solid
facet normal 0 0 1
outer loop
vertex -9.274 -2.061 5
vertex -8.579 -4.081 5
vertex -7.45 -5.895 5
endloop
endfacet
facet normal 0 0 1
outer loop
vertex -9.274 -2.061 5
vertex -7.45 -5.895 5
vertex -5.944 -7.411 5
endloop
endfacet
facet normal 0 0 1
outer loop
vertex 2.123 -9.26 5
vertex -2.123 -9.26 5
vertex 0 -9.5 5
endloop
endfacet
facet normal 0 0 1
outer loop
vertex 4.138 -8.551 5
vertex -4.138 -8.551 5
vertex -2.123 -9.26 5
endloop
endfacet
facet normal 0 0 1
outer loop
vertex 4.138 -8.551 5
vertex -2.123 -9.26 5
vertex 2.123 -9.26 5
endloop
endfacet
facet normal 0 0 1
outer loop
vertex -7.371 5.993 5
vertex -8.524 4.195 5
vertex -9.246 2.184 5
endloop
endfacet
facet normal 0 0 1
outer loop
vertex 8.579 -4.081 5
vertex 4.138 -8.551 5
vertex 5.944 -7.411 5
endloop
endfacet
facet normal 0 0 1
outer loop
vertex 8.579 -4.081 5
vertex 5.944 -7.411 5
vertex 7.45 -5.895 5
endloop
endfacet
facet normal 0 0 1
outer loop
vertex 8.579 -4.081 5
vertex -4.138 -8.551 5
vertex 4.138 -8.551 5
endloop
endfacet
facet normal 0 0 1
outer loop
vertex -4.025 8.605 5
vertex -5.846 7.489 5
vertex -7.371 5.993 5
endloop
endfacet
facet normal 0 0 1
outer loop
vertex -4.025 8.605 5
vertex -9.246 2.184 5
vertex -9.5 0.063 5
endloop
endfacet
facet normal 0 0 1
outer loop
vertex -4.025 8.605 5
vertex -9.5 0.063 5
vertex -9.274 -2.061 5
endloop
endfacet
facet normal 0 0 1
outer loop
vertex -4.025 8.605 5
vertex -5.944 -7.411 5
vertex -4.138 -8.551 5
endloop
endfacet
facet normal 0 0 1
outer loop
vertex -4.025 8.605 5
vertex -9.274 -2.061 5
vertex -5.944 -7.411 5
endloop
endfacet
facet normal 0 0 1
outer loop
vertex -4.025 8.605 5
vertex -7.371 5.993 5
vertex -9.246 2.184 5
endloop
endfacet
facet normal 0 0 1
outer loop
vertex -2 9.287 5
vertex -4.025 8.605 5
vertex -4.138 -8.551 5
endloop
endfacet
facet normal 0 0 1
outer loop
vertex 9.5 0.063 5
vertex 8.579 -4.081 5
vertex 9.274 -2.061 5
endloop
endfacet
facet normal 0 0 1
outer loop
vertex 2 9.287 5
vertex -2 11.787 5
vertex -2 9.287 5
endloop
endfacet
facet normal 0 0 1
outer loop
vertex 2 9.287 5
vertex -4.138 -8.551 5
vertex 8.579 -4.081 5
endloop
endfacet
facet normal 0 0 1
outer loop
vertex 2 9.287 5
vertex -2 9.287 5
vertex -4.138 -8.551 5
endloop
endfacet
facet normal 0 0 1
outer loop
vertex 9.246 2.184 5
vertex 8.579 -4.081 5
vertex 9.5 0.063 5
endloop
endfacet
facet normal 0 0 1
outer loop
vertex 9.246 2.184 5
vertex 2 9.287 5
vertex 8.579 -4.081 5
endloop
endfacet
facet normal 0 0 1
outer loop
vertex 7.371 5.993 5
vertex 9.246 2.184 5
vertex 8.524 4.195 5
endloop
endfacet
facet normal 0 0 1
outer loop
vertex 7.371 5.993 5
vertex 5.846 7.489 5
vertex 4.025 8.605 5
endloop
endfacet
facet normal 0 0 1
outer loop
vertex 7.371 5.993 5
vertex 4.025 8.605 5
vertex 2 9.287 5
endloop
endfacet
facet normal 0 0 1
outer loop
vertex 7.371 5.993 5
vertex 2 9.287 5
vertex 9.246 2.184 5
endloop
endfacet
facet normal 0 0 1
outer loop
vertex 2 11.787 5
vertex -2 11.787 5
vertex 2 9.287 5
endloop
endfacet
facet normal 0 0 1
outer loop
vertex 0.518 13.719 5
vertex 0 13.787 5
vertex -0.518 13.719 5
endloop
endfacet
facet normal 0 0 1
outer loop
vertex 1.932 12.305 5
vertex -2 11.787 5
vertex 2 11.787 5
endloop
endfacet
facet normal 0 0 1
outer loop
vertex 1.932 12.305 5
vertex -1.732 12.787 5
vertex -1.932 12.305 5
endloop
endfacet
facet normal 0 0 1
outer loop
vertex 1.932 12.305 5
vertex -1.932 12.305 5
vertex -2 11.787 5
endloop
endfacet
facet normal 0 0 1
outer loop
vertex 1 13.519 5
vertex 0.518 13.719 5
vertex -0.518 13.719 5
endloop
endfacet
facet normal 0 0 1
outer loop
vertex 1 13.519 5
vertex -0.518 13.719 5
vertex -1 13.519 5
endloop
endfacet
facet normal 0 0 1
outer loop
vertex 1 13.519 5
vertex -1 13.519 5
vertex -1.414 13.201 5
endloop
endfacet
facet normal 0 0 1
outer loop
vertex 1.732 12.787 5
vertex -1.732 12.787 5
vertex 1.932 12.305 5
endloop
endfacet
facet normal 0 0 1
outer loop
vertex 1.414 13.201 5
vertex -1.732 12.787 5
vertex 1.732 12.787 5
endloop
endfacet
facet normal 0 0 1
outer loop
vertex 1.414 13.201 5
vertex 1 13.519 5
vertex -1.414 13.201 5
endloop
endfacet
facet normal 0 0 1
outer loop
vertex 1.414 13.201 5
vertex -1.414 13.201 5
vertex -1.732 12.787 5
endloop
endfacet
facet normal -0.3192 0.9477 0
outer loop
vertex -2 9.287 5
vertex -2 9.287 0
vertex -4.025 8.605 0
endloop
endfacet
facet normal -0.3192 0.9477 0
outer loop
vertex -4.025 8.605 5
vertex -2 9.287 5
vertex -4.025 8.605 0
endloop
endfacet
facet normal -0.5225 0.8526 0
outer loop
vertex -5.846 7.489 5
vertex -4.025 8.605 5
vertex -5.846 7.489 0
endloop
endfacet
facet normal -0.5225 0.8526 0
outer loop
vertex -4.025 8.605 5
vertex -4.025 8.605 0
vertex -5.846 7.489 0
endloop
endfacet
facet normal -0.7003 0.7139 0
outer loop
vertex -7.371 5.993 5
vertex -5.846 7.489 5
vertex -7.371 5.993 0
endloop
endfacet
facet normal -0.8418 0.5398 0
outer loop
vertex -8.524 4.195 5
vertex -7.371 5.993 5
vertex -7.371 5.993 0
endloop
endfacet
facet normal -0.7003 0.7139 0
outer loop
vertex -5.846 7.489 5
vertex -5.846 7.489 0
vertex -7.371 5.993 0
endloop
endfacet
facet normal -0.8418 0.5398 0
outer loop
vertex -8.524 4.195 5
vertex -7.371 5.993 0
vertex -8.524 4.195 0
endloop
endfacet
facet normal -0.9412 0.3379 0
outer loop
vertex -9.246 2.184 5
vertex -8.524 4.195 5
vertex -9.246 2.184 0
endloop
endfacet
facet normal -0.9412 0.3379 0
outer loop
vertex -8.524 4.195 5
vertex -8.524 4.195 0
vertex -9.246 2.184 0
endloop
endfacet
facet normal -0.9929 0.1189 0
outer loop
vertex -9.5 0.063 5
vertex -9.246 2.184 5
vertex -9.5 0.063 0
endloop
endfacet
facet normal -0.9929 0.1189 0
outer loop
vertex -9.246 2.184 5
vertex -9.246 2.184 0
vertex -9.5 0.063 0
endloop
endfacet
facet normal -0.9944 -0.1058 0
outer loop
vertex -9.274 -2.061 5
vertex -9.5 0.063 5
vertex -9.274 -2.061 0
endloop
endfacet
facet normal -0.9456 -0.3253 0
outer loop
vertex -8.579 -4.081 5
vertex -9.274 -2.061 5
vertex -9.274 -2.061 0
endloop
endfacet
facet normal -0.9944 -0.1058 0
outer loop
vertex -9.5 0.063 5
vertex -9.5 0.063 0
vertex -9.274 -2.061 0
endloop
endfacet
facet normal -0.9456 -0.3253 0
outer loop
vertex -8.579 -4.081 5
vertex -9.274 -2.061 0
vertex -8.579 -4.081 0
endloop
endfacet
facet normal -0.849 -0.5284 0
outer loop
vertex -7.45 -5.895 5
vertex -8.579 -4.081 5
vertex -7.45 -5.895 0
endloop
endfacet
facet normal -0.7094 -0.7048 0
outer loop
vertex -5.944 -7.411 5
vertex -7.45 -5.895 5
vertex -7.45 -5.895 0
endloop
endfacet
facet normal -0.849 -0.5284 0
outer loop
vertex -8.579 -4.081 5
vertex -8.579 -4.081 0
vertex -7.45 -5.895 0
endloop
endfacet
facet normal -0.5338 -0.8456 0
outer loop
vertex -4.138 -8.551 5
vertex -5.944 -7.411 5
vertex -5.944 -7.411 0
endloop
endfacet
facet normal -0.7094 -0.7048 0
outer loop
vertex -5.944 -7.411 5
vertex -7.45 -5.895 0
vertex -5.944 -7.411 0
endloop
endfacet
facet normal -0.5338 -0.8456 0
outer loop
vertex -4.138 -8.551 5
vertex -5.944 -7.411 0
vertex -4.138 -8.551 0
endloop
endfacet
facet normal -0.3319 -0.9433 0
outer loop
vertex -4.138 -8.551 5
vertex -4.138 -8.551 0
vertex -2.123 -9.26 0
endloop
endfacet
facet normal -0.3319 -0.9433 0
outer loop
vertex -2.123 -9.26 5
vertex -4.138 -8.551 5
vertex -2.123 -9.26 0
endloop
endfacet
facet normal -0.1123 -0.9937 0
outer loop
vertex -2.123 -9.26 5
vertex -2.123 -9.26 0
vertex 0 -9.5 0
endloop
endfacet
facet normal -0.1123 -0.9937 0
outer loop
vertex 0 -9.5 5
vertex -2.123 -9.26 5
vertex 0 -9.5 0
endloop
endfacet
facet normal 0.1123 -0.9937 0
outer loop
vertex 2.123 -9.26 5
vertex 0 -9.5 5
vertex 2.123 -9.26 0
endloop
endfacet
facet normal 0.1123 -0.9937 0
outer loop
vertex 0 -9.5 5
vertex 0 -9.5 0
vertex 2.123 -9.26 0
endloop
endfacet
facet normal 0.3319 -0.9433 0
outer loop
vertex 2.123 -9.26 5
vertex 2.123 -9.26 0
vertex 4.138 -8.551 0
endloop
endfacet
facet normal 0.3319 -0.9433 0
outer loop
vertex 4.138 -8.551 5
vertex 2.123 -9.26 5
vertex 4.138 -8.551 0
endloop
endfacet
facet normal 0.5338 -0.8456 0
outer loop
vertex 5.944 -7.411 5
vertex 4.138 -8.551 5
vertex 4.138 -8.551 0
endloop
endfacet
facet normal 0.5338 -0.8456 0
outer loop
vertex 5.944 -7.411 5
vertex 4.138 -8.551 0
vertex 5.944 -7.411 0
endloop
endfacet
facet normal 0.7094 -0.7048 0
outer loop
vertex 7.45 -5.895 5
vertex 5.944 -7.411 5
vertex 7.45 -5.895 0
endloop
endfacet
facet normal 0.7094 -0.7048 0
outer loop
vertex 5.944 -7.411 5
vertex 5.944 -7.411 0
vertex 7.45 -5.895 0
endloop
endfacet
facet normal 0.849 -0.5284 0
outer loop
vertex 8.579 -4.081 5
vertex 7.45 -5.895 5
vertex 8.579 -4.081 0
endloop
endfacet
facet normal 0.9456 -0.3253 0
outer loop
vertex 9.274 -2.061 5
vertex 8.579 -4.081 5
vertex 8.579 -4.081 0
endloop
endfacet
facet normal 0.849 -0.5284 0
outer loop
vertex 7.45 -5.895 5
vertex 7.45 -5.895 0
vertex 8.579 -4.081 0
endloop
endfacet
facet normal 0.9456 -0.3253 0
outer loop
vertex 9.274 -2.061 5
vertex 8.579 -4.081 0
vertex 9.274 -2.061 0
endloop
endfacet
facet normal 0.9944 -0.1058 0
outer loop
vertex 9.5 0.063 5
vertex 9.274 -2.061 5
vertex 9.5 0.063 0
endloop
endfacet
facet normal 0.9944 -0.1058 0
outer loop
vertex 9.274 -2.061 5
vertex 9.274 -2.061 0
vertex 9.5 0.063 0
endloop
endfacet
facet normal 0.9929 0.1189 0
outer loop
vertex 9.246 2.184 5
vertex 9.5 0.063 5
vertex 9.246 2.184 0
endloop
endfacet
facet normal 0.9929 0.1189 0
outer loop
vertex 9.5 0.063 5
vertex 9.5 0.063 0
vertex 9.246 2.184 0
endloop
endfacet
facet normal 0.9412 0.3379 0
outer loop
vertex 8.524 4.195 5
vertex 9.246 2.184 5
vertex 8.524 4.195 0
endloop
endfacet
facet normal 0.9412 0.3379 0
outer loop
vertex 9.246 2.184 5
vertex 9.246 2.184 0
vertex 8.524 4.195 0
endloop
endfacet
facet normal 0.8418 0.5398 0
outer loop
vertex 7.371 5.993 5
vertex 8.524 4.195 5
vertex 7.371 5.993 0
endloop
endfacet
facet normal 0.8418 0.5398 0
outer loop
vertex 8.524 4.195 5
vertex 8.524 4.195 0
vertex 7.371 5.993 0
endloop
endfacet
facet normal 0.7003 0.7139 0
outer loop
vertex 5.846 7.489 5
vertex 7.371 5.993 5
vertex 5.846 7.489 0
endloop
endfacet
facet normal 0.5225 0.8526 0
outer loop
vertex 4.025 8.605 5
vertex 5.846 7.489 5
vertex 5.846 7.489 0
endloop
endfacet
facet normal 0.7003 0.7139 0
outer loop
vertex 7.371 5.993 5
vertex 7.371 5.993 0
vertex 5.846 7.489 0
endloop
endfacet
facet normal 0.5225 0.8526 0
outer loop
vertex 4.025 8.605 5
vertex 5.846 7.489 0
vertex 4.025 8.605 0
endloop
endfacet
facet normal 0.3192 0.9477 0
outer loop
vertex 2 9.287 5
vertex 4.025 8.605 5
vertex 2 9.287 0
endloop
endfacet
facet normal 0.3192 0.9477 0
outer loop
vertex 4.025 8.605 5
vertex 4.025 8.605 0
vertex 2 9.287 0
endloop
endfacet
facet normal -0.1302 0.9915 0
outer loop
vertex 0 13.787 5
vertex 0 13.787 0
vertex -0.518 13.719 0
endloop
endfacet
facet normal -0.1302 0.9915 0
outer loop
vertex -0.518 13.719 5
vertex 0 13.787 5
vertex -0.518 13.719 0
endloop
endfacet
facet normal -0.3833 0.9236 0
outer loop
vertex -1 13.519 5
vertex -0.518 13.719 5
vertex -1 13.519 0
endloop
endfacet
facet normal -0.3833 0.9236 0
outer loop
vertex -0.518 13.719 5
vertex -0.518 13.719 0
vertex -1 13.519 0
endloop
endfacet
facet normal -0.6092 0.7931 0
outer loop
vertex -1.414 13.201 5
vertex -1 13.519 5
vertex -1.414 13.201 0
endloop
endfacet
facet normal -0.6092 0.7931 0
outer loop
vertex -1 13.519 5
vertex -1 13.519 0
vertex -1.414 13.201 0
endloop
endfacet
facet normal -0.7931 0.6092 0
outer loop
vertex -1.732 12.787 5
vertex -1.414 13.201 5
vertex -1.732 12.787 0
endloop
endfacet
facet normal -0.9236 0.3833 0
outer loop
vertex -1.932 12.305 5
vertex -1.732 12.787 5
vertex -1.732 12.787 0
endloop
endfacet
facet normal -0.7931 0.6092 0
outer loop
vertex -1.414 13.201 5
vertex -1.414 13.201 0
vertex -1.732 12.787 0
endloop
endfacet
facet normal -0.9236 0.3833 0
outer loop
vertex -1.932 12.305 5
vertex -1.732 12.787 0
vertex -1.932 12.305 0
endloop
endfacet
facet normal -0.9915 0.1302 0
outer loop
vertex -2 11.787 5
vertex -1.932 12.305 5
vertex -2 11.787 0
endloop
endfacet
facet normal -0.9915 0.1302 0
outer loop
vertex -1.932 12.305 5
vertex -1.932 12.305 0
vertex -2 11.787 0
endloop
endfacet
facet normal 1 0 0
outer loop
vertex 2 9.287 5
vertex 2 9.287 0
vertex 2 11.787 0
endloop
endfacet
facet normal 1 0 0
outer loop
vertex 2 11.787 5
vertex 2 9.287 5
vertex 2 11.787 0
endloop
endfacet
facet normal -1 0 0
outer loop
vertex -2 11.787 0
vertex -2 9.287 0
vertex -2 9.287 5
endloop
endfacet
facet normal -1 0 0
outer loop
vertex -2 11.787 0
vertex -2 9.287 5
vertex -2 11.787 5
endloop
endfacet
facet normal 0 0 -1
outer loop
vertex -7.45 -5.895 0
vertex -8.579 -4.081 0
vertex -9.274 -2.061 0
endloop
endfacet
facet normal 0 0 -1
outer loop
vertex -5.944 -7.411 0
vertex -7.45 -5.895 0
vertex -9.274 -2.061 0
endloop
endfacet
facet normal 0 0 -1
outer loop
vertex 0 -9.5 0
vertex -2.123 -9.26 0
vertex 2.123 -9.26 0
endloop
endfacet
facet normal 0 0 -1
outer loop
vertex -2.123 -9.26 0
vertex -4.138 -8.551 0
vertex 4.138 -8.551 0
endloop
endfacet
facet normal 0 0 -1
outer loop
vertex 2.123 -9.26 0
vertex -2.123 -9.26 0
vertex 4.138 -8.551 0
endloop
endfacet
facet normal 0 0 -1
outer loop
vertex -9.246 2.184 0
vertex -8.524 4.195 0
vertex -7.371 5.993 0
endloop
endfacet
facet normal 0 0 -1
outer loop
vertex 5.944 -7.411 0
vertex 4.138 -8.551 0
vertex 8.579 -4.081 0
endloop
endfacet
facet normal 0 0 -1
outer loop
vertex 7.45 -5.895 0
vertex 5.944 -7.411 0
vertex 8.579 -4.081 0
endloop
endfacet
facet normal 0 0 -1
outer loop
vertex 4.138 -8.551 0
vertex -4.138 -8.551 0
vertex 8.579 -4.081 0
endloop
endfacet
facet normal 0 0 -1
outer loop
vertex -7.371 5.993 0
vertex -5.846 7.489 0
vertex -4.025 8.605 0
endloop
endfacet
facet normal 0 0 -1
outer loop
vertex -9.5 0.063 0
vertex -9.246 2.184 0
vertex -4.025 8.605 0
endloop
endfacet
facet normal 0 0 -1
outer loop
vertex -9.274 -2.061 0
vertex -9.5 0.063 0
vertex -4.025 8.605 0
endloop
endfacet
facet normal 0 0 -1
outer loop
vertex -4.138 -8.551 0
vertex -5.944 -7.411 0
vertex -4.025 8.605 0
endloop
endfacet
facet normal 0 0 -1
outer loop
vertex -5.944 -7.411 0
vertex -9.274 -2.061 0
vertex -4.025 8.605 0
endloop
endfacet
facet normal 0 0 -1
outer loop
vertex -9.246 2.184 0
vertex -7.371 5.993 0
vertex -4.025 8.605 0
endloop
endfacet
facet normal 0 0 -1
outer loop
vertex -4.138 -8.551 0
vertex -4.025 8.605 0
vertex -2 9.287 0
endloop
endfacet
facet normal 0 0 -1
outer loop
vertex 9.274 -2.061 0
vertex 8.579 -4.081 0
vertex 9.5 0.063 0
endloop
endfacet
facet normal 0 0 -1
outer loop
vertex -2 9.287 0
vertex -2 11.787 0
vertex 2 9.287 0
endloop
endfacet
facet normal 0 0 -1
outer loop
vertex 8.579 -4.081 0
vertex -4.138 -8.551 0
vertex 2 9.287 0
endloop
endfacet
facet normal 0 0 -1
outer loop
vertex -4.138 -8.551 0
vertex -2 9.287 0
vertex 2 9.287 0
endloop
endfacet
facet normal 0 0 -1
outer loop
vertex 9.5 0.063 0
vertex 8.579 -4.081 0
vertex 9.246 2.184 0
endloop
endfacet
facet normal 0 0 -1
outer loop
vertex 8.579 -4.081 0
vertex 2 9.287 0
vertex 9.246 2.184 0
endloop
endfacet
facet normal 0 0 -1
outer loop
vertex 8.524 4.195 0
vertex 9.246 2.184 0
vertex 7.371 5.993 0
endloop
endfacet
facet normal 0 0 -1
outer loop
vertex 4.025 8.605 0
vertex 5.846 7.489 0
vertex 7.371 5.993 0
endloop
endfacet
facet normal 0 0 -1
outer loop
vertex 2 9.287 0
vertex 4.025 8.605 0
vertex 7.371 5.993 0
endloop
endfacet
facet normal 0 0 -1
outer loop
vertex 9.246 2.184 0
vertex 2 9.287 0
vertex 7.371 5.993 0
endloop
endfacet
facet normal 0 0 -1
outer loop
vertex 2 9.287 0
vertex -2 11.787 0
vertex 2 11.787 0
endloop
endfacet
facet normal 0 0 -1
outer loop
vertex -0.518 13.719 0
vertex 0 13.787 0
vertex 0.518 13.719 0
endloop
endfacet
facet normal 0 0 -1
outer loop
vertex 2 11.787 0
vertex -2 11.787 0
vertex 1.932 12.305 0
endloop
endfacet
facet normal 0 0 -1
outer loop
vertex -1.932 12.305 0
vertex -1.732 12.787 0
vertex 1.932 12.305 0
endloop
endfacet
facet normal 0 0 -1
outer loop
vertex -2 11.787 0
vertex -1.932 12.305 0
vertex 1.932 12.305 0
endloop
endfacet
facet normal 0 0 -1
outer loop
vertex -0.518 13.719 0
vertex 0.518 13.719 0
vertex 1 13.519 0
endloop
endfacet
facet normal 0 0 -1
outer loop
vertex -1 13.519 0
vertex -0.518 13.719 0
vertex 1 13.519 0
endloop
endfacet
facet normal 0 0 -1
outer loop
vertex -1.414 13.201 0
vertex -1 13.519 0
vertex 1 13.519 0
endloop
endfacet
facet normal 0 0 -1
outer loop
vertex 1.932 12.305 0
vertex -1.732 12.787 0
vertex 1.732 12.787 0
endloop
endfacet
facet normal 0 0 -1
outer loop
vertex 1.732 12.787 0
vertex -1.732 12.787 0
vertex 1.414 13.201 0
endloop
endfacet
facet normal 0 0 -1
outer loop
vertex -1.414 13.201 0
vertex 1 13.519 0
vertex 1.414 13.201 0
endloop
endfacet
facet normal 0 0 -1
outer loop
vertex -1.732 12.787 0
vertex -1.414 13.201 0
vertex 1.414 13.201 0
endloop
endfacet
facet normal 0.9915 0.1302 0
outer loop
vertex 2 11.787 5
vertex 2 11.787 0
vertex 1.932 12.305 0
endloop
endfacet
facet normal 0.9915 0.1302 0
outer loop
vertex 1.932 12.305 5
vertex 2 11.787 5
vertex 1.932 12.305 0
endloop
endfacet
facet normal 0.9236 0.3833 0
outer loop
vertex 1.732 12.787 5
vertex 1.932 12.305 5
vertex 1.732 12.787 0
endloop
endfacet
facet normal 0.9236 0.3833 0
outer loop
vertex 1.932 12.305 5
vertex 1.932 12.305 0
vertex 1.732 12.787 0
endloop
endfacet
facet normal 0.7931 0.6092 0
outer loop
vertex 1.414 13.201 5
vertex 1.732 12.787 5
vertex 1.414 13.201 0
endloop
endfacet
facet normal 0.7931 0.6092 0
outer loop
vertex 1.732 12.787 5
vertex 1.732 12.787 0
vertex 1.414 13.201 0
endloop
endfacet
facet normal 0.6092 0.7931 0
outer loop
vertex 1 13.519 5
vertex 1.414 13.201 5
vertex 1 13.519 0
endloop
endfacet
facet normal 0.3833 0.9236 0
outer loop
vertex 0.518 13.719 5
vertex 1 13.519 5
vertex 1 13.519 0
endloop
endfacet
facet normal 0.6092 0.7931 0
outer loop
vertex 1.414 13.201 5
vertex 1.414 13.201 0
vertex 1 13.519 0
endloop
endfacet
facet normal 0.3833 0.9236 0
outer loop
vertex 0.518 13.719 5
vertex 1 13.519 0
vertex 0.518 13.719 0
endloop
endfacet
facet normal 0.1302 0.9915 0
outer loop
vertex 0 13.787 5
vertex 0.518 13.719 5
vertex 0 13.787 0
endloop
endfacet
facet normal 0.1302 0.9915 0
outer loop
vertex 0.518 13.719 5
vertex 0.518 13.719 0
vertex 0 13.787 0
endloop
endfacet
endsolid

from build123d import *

# Parameters (mm, degrees)
PAD_DEPTH = 5


with BuildPart() as part:
    # Sketch → Pad (new body)
    with BuildSketch(Plane.XY):
        with BuildLine():
            ThreePointArc((-2, 9.287088), (0, -9.5), (2, 9.287088))
            Line((2, 9.287088), (2, 11.787088))
            ThreePointArc((2, 11.787088), (1.414214, 13.201301), (0, 13.787088))
            ThreePointArc((0, 13.787088), (-1.414214, 13.201301), (-2, 11.787088))
            Line((-2, 9.287088), (-2, 11.787088))
        make_face()
    extrude(amount=PAD_DEPTH)


solid = part.part
